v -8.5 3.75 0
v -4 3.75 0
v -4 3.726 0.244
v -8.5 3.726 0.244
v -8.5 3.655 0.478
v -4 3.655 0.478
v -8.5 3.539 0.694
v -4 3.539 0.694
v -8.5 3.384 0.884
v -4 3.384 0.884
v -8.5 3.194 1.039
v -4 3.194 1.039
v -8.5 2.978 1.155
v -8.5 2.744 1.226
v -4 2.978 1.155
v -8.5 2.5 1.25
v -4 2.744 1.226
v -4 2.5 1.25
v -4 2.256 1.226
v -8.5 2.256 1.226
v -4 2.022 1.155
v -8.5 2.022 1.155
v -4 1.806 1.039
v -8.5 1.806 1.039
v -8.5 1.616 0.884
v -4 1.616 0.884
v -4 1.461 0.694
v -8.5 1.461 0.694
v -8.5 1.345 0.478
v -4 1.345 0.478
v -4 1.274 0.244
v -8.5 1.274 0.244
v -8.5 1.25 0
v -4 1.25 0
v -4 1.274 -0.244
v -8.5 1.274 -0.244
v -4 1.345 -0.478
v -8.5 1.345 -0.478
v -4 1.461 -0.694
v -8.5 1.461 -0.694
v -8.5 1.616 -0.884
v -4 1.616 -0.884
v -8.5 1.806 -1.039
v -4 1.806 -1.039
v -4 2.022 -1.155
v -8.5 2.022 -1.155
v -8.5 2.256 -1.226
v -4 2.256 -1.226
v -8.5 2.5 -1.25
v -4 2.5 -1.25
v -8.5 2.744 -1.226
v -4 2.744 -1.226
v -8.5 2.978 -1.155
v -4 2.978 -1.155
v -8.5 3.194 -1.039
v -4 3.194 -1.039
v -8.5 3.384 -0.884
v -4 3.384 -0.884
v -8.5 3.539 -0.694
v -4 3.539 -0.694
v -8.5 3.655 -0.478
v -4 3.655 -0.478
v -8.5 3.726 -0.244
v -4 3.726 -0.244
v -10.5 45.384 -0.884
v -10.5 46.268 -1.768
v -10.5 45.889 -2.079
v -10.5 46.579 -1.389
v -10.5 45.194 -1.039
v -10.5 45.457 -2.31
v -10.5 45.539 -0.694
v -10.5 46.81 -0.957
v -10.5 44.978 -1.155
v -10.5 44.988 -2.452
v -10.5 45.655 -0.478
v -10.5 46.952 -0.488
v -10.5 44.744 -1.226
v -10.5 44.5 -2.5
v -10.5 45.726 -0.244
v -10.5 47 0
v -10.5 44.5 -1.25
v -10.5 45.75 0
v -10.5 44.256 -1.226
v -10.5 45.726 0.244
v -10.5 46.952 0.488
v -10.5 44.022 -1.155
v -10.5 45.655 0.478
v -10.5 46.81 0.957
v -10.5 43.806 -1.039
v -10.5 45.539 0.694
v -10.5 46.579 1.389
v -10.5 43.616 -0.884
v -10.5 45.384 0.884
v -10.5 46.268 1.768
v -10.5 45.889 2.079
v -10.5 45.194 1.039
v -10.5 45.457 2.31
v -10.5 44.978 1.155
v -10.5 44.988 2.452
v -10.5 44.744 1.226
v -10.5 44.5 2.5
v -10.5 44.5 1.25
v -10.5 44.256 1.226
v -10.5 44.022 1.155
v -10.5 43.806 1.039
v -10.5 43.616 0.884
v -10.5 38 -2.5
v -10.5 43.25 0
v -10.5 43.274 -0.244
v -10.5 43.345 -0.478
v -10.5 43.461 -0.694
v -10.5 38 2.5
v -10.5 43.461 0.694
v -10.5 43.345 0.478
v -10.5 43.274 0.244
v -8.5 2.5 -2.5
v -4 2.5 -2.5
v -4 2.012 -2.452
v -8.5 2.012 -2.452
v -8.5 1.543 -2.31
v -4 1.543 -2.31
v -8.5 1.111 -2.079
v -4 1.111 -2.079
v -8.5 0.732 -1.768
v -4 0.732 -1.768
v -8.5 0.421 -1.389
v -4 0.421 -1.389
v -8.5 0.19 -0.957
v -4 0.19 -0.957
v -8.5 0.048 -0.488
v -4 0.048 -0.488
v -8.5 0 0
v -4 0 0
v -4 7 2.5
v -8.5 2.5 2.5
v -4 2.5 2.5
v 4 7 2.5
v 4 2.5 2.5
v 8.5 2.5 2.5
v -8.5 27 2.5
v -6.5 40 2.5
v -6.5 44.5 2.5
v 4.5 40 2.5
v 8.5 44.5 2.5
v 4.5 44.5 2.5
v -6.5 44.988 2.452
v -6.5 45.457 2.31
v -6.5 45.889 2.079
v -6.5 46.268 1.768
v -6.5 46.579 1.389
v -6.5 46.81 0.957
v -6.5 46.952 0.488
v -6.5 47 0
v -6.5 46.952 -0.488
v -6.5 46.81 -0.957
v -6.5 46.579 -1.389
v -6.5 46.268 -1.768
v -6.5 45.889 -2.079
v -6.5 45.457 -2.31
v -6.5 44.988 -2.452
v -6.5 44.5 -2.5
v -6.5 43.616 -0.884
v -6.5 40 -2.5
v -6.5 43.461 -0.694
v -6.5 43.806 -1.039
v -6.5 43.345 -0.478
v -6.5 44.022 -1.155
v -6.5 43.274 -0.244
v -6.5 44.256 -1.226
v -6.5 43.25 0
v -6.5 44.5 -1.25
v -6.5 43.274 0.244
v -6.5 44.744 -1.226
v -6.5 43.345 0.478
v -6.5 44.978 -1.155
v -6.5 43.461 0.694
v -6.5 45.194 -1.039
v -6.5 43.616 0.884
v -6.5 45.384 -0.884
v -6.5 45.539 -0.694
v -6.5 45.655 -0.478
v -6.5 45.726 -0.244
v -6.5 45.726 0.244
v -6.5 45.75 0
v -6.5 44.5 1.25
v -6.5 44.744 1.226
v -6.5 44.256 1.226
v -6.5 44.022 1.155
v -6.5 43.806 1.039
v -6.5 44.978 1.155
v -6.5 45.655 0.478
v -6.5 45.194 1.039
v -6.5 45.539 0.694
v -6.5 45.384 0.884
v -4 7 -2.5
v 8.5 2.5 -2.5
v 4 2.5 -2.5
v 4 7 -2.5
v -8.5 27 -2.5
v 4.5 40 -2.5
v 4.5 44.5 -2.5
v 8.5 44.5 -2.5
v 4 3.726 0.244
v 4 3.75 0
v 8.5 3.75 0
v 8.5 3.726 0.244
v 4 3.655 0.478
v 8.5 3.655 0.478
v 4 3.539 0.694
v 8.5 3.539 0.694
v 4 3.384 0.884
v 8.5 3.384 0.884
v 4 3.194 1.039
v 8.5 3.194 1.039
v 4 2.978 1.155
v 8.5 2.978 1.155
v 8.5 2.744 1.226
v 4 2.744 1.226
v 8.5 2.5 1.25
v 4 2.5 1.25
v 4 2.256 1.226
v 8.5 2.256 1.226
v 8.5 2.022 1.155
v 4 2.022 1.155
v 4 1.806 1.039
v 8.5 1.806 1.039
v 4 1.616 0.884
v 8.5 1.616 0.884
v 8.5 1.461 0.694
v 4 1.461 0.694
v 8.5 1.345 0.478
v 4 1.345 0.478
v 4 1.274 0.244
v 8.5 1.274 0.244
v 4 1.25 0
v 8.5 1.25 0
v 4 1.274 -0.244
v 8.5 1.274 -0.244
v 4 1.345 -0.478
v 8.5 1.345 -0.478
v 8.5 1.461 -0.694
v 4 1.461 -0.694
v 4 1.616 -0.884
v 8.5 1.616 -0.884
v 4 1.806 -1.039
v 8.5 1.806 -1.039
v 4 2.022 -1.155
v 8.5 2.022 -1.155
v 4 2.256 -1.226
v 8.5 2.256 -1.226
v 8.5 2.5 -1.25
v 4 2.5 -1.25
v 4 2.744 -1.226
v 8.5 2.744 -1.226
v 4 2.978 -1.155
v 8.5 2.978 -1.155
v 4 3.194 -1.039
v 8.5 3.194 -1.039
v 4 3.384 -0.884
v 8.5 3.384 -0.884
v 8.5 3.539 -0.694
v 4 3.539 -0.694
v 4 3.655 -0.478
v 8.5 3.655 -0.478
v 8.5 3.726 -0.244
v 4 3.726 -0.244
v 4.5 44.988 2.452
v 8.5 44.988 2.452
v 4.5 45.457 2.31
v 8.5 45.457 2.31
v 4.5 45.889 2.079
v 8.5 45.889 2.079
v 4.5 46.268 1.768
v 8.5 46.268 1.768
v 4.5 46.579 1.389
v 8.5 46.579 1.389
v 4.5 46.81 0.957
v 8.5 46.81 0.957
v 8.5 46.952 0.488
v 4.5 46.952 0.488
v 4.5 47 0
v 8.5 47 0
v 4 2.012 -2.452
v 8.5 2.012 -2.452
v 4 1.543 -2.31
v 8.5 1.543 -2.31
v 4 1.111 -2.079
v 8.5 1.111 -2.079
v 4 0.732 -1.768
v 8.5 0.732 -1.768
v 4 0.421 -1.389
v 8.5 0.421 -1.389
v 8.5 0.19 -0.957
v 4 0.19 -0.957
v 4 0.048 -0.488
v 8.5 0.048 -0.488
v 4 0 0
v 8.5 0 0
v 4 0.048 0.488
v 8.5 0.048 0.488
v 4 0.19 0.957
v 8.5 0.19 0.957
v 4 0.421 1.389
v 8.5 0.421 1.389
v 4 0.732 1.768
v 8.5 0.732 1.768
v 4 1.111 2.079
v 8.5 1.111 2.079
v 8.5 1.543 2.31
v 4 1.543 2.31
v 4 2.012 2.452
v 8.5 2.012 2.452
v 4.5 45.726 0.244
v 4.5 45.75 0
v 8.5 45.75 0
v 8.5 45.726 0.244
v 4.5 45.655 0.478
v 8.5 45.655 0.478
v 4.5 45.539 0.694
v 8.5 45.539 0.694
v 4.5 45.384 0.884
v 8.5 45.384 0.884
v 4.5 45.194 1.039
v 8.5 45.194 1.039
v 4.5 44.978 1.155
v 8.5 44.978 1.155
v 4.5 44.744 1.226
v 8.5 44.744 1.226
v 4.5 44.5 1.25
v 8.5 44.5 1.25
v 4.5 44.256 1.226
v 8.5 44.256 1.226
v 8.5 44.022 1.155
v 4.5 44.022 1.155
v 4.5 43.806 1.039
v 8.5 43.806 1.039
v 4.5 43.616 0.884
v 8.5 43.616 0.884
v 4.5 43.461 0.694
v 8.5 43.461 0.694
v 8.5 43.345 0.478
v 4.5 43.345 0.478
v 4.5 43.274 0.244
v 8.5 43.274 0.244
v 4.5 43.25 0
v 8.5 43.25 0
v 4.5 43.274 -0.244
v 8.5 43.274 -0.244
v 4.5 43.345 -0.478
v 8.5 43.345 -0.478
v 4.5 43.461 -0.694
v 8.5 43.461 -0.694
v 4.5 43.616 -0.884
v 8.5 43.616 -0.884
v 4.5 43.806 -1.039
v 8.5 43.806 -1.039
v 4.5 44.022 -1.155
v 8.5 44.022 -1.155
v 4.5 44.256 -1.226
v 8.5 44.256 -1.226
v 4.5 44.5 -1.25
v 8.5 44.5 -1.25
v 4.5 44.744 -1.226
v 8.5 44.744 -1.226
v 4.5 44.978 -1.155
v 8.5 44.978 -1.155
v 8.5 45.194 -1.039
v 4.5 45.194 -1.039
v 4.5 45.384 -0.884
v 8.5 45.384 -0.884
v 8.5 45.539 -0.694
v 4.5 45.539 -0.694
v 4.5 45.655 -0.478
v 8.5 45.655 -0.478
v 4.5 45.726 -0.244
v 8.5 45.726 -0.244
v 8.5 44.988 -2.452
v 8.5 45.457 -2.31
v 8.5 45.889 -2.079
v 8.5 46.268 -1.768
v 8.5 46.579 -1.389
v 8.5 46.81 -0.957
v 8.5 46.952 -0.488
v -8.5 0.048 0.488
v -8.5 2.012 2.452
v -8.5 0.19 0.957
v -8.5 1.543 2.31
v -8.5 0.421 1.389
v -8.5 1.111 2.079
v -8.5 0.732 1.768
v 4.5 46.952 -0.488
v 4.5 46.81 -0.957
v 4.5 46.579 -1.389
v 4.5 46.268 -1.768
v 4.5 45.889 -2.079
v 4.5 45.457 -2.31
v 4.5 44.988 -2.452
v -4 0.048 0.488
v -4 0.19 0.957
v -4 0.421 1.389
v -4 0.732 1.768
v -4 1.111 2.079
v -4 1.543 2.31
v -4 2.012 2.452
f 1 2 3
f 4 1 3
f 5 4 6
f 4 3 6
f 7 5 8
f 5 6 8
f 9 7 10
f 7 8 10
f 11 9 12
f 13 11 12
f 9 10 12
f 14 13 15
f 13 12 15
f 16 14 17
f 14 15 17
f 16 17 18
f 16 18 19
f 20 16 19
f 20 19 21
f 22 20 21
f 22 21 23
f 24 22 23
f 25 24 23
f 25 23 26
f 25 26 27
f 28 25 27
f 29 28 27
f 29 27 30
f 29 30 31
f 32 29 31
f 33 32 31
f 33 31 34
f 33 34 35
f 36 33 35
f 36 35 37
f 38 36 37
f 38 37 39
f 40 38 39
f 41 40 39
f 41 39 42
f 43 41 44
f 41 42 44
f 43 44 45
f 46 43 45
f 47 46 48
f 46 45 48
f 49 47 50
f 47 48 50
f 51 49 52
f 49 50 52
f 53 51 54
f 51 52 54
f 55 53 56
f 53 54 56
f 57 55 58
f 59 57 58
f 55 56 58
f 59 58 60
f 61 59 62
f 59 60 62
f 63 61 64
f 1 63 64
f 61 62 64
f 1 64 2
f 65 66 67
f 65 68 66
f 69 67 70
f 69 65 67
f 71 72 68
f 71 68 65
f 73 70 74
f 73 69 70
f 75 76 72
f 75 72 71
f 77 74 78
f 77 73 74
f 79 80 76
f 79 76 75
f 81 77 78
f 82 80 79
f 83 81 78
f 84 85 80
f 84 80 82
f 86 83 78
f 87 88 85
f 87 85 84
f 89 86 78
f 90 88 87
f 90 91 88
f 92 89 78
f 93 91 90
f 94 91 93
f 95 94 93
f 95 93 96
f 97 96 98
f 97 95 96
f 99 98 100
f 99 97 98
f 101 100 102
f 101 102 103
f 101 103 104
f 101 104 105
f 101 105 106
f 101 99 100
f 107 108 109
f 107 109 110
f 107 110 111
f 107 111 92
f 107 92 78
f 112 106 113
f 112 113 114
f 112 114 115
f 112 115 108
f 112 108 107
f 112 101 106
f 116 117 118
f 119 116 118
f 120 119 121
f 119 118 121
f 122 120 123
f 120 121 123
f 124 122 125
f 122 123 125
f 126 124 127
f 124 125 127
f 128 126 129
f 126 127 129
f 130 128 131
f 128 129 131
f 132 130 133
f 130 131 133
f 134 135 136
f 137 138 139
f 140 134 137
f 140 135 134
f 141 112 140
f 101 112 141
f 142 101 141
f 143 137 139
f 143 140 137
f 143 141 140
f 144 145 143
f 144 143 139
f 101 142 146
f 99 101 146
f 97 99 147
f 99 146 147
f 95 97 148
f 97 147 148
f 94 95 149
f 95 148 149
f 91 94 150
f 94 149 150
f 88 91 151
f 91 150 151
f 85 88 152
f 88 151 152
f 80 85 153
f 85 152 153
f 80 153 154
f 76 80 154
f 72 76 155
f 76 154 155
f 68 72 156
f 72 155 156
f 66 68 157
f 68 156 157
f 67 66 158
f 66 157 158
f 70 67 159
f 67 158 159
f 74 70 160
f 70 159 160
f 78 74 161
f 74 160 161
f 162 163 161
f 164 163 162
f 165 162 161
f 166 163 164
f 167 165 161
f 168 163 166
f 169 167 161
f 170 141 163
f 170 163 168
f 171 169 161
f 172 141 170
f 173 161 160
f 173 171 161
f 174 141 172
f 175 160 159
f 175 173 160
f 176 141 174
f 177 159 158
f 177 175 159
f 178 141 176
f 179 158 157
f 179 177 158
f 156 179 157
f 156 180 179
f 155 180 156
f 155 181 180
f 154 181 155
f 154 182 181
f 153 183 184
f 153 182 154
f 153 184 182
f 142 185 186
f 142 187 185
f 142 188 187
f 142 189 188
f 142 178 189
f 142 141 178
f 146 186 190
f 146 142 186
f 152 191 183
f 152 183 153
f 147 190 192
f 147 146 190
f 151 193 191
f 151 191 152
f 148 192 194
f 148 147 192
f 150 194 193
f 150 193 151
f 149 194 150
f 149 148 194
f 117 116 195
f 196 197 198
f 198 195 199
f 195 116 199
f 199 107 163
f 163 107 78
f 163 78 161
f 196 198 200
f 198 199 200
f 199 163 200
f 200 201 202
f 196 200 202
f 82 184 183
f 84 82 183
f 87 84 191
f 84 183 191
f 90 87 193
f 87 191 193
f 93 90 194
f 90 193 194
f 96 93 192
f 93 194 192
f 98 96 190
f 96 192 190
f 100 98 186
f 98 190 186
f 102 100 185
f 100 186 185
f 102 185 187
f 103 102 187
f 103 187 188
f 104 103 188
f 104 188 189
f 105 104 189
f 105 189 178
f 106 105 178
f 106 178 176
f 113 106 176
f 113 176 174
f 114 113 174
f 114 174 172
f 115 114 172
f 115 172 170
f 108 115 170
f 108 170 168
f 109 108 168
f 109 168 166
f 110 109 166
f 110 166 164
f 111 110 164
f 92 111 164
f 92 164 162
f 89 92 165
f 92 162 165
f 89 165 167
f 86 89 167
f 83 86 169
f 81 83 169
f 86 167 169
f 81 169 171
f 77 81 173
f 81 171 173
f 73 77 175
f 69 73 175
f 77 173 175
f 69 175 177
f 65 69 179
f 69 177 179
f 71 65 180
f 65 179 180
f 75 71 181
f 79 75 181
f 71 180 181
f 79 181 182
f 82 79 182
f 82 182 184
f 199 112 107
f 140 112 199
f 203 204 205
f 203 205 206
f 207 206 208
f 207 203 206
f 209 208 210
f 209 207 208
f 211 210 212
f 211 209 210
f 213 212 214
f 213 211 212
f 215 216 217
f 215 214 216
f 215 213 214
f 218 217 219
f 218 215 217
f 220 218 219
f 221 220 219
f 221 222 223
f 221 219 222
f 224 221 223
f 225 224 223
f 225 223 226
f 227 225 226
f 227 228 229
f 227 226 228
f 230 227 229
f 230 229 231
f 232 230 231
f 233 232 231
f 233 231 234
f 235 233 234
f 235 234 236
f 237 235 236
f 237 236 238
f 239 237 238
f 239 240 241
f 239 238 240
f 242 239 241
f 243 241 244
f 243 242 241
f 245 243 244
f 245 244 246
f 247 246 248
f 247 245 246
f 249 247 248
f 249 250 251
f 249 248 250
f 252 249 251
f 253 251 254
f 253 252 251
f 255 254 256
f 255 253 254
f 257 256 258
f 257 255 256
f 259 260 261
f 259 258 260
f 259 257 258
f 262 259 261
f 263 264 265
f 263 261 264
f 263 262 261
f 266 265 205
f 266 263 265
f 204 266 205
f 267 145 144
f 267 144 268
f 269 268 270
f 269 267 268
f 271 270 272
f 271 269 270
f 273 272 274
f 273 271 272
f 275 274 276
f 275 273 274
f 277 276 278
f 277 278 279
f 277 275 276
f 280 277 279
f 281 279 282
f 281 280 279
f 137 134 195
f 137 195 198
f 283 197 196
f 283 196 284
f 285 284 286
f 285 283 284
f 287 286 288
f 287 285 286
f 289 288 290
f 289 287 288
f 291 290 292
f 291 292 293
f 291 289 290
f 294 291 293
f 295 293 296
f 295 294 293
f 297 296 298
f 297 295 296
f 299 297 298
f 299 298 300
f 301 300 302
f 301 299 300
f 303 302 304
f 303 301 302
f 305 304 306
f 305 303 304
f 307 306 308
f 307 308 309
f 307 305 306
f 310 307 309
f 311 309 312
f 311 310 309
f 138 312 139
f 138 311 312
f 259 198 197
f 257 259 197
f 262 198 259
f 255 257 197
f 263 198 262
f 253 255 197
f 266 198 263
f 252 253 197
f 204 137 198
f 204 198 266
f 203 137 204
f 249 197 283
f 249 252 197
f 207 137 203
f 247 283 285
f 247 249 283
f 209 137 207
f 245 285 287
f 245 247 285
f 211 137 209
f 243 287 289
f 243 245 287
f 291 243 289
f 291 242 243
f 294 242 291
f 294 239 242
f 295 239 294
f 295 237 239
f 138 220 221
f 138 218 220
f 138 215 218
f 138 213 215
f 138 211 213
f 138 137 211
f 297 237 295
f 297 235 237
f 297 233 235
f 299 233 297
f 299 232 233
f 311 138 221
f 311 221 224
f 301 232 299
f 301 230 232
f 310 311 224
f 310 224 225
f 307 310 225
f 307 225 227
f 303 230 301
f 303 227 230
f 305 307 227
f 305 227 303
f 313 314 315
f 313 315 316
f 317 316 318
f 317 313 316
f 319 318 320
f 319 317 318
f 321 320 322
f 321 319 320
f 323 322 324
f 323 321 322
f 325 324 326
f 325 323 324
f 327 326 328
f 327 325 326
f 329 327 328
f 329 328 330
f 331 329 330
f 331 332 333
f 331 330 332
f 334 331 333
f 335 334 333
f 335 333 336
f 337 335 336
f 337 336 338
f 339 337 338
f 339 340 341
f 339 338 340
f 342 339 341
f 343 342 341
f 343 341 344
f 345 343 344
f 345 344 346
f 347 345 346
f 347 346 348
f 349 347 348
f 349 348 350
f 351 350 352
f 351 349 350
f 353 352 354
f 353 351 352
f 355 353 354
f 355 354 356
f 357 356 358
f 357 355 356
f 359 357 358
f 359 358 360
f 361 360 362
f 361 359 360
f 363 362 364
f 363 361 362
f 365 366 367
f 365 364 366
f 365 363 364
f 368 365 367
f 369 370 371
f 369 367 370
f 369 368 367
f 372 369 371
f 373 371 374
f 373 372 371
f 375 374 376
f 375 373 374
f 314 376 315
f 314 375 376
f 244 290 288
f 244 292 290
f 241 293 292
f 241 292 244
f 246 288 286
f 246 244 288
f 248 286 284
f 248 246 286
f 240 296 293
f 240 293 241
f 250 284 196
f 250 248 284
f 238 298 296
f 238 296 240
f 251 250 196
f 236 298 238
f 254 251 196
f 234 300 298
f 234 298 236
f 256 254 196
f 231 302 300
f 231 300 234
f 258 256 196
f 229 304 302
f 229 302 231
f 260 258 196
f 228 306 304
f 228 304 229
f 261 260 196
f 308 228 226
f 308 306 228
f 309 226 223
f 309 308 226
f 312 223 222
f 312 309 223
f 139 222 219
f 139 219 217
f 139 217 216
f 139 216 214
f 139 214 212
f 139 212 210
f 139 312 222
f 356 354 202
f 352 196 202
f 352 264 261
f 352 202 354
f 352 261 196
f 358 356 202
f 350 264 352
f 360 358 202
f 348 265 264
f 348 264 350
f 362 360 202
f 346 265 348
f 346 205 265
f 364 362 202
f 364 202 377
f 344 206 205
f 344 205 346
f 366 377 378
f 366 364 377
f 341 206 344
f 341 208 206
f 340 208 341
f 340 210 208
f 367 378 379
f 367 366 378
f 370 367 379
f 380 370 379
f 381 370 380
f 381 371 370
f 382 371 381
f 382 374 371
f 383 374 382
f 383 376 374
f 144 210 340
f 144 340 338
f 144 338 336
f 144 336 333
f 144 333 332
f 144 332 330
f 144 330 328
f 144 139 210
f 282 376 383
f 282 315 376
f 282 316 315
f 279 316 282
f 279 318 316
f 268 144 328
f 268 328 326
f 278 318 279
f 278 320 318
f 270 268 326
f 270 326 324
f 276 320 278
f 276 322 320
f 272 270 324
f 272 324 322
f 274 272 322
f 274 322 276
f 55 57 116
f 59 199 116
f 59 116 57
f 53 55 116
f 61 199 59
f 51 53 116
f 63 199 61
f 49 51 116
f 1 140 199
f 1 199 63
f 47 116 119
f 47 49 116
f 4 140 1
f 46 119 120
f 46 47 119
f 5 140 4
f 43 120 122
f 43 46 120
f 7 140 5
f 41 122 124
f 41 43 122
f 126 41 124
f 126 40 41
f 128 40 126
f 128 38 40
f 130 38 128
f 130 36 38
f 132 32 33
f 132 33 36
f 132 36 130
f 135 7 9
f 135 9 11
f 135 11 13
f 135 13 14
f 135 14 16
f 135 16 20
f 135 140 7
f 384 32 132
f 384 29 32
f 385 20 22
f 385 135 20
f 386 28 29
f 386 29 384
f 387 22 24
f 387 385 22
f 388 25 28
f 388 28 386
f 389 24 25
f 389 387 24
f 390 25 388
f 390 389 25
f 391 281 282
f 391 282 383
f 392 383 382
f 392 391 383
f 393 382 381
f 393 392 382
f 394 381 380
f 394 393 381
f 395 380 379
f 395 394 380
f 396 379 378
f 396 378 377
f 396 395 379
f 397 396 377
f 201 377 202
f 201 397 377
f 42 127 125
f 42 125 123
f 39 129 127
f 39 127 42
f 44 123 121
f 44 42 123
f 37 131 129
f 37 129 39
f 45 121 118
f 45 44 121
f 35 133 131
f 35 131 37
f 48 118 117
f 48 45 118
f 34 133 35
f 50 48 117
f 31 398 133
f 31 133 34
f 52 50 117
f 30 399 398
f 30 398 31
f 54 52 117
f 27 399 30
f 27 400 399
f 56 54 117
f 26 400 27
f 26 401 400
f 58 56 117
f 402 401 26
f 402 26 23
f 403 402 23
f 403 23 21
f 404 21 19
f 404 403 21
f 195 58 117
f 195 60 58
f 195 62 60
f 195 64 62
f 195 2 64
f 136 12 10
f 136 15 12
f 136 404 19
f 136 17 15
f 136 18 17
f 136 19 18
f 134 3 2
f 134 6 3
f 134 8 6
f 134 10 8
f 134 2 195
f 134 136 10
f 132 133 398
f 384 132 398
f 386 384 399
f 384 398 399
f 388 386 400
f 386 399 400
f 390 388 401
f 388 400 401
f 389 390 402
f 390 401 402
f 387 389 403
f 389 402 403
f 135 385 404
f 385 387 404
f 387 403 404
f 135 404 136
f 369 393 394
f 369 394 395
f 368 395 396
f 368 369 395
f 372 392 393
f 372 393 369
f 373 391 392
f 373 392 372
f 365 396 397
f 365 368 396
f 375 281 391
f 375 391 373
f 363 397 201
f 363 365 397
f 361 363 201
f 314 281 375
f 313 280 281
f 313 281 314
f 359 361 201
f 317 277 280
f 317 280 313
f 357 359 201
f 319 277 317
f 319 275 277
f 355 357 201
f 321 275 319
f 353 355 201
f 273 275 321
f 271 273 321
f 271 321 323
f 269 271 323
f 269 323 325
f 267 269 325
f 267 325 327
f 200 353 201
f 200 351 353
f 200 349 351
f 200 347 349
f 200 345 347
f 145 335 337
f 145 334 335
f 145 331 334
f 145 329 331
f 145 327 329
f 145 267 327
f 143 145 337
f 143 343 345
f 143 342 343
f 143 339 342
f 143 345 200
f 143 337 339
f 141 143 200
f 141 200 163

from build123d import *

# Parameters (mm, degrees)
F1_DEPTH      = 2.5
F2_R          = 1.25
F3_DEPTH      = 10.501
F3_DEPTH_BACK = 8.501


with BuildPart() as f1:
    # F0 (on Top) → F1 (new body, symmetric)
    with BuildSketch(Plane.XY):
        Polygon((-8.5, 27), (-8.5, 0), (-4, 0), (-4, 7), (4, 7), (4, 0), (8.5, 0), (8.5, 47), (4.5, 47), (4.5, 40), (-6.5, 40), (-6.5, 47), (-10.5, 47), (-10.5, 38), align=None)
    extrude(amount=F1_DEPTH, both=True)

    # F2 (on Right) → F3 (cut, two sides)
    with BuildSketch(Plane.YZ) as f3_sk:
        with Locations((2.5, 0)):
            Circle(F2_R)
        with BuildLine():
            ThreePointArc((2.5, -2.5), (0.732233047, -1.767766953), (0, 0))
            Line((0, 0), (0, -2.5))
            Line((0, -2.5), (2.5, -2.5))
        make_face()
        with BuildLine():
            ThreePointArc((0, 0), (0.732233047, 1.767766953), (2.5, 2.5))
            Line((2.5, 2.5), (0, 2.5))
            Line((0, 2.5), (0, 0))
        make_face()
        with Locations((44.5, 0)):
            Circle(F2_R)
        with BuildLine():
            ThreePointArc((44.5, 2.5), (46.267766953, 1.767766953), (47, 0))
            Line((47, 0), (47, 2.5))
            Line((47, 2.5), (44.5, 2.5))
        make_face()
        with BuildLine():
            ThreePointArc((47, 0), (46.267766953, -1.767766953), (44.5, -2.5))
            Line((44.5, -2.5), (47, -2.5))
            Line((47, -2.5), (47, 0))
        make_face()
    extrude(amount=-F3_DEPTH, mode=Mode.SUBTRACT)
    extrude(f3_sk.sketch, amount=F3_DEPTH_BACK, mode=Mode.SUBTRACT)


solid = f1.part
